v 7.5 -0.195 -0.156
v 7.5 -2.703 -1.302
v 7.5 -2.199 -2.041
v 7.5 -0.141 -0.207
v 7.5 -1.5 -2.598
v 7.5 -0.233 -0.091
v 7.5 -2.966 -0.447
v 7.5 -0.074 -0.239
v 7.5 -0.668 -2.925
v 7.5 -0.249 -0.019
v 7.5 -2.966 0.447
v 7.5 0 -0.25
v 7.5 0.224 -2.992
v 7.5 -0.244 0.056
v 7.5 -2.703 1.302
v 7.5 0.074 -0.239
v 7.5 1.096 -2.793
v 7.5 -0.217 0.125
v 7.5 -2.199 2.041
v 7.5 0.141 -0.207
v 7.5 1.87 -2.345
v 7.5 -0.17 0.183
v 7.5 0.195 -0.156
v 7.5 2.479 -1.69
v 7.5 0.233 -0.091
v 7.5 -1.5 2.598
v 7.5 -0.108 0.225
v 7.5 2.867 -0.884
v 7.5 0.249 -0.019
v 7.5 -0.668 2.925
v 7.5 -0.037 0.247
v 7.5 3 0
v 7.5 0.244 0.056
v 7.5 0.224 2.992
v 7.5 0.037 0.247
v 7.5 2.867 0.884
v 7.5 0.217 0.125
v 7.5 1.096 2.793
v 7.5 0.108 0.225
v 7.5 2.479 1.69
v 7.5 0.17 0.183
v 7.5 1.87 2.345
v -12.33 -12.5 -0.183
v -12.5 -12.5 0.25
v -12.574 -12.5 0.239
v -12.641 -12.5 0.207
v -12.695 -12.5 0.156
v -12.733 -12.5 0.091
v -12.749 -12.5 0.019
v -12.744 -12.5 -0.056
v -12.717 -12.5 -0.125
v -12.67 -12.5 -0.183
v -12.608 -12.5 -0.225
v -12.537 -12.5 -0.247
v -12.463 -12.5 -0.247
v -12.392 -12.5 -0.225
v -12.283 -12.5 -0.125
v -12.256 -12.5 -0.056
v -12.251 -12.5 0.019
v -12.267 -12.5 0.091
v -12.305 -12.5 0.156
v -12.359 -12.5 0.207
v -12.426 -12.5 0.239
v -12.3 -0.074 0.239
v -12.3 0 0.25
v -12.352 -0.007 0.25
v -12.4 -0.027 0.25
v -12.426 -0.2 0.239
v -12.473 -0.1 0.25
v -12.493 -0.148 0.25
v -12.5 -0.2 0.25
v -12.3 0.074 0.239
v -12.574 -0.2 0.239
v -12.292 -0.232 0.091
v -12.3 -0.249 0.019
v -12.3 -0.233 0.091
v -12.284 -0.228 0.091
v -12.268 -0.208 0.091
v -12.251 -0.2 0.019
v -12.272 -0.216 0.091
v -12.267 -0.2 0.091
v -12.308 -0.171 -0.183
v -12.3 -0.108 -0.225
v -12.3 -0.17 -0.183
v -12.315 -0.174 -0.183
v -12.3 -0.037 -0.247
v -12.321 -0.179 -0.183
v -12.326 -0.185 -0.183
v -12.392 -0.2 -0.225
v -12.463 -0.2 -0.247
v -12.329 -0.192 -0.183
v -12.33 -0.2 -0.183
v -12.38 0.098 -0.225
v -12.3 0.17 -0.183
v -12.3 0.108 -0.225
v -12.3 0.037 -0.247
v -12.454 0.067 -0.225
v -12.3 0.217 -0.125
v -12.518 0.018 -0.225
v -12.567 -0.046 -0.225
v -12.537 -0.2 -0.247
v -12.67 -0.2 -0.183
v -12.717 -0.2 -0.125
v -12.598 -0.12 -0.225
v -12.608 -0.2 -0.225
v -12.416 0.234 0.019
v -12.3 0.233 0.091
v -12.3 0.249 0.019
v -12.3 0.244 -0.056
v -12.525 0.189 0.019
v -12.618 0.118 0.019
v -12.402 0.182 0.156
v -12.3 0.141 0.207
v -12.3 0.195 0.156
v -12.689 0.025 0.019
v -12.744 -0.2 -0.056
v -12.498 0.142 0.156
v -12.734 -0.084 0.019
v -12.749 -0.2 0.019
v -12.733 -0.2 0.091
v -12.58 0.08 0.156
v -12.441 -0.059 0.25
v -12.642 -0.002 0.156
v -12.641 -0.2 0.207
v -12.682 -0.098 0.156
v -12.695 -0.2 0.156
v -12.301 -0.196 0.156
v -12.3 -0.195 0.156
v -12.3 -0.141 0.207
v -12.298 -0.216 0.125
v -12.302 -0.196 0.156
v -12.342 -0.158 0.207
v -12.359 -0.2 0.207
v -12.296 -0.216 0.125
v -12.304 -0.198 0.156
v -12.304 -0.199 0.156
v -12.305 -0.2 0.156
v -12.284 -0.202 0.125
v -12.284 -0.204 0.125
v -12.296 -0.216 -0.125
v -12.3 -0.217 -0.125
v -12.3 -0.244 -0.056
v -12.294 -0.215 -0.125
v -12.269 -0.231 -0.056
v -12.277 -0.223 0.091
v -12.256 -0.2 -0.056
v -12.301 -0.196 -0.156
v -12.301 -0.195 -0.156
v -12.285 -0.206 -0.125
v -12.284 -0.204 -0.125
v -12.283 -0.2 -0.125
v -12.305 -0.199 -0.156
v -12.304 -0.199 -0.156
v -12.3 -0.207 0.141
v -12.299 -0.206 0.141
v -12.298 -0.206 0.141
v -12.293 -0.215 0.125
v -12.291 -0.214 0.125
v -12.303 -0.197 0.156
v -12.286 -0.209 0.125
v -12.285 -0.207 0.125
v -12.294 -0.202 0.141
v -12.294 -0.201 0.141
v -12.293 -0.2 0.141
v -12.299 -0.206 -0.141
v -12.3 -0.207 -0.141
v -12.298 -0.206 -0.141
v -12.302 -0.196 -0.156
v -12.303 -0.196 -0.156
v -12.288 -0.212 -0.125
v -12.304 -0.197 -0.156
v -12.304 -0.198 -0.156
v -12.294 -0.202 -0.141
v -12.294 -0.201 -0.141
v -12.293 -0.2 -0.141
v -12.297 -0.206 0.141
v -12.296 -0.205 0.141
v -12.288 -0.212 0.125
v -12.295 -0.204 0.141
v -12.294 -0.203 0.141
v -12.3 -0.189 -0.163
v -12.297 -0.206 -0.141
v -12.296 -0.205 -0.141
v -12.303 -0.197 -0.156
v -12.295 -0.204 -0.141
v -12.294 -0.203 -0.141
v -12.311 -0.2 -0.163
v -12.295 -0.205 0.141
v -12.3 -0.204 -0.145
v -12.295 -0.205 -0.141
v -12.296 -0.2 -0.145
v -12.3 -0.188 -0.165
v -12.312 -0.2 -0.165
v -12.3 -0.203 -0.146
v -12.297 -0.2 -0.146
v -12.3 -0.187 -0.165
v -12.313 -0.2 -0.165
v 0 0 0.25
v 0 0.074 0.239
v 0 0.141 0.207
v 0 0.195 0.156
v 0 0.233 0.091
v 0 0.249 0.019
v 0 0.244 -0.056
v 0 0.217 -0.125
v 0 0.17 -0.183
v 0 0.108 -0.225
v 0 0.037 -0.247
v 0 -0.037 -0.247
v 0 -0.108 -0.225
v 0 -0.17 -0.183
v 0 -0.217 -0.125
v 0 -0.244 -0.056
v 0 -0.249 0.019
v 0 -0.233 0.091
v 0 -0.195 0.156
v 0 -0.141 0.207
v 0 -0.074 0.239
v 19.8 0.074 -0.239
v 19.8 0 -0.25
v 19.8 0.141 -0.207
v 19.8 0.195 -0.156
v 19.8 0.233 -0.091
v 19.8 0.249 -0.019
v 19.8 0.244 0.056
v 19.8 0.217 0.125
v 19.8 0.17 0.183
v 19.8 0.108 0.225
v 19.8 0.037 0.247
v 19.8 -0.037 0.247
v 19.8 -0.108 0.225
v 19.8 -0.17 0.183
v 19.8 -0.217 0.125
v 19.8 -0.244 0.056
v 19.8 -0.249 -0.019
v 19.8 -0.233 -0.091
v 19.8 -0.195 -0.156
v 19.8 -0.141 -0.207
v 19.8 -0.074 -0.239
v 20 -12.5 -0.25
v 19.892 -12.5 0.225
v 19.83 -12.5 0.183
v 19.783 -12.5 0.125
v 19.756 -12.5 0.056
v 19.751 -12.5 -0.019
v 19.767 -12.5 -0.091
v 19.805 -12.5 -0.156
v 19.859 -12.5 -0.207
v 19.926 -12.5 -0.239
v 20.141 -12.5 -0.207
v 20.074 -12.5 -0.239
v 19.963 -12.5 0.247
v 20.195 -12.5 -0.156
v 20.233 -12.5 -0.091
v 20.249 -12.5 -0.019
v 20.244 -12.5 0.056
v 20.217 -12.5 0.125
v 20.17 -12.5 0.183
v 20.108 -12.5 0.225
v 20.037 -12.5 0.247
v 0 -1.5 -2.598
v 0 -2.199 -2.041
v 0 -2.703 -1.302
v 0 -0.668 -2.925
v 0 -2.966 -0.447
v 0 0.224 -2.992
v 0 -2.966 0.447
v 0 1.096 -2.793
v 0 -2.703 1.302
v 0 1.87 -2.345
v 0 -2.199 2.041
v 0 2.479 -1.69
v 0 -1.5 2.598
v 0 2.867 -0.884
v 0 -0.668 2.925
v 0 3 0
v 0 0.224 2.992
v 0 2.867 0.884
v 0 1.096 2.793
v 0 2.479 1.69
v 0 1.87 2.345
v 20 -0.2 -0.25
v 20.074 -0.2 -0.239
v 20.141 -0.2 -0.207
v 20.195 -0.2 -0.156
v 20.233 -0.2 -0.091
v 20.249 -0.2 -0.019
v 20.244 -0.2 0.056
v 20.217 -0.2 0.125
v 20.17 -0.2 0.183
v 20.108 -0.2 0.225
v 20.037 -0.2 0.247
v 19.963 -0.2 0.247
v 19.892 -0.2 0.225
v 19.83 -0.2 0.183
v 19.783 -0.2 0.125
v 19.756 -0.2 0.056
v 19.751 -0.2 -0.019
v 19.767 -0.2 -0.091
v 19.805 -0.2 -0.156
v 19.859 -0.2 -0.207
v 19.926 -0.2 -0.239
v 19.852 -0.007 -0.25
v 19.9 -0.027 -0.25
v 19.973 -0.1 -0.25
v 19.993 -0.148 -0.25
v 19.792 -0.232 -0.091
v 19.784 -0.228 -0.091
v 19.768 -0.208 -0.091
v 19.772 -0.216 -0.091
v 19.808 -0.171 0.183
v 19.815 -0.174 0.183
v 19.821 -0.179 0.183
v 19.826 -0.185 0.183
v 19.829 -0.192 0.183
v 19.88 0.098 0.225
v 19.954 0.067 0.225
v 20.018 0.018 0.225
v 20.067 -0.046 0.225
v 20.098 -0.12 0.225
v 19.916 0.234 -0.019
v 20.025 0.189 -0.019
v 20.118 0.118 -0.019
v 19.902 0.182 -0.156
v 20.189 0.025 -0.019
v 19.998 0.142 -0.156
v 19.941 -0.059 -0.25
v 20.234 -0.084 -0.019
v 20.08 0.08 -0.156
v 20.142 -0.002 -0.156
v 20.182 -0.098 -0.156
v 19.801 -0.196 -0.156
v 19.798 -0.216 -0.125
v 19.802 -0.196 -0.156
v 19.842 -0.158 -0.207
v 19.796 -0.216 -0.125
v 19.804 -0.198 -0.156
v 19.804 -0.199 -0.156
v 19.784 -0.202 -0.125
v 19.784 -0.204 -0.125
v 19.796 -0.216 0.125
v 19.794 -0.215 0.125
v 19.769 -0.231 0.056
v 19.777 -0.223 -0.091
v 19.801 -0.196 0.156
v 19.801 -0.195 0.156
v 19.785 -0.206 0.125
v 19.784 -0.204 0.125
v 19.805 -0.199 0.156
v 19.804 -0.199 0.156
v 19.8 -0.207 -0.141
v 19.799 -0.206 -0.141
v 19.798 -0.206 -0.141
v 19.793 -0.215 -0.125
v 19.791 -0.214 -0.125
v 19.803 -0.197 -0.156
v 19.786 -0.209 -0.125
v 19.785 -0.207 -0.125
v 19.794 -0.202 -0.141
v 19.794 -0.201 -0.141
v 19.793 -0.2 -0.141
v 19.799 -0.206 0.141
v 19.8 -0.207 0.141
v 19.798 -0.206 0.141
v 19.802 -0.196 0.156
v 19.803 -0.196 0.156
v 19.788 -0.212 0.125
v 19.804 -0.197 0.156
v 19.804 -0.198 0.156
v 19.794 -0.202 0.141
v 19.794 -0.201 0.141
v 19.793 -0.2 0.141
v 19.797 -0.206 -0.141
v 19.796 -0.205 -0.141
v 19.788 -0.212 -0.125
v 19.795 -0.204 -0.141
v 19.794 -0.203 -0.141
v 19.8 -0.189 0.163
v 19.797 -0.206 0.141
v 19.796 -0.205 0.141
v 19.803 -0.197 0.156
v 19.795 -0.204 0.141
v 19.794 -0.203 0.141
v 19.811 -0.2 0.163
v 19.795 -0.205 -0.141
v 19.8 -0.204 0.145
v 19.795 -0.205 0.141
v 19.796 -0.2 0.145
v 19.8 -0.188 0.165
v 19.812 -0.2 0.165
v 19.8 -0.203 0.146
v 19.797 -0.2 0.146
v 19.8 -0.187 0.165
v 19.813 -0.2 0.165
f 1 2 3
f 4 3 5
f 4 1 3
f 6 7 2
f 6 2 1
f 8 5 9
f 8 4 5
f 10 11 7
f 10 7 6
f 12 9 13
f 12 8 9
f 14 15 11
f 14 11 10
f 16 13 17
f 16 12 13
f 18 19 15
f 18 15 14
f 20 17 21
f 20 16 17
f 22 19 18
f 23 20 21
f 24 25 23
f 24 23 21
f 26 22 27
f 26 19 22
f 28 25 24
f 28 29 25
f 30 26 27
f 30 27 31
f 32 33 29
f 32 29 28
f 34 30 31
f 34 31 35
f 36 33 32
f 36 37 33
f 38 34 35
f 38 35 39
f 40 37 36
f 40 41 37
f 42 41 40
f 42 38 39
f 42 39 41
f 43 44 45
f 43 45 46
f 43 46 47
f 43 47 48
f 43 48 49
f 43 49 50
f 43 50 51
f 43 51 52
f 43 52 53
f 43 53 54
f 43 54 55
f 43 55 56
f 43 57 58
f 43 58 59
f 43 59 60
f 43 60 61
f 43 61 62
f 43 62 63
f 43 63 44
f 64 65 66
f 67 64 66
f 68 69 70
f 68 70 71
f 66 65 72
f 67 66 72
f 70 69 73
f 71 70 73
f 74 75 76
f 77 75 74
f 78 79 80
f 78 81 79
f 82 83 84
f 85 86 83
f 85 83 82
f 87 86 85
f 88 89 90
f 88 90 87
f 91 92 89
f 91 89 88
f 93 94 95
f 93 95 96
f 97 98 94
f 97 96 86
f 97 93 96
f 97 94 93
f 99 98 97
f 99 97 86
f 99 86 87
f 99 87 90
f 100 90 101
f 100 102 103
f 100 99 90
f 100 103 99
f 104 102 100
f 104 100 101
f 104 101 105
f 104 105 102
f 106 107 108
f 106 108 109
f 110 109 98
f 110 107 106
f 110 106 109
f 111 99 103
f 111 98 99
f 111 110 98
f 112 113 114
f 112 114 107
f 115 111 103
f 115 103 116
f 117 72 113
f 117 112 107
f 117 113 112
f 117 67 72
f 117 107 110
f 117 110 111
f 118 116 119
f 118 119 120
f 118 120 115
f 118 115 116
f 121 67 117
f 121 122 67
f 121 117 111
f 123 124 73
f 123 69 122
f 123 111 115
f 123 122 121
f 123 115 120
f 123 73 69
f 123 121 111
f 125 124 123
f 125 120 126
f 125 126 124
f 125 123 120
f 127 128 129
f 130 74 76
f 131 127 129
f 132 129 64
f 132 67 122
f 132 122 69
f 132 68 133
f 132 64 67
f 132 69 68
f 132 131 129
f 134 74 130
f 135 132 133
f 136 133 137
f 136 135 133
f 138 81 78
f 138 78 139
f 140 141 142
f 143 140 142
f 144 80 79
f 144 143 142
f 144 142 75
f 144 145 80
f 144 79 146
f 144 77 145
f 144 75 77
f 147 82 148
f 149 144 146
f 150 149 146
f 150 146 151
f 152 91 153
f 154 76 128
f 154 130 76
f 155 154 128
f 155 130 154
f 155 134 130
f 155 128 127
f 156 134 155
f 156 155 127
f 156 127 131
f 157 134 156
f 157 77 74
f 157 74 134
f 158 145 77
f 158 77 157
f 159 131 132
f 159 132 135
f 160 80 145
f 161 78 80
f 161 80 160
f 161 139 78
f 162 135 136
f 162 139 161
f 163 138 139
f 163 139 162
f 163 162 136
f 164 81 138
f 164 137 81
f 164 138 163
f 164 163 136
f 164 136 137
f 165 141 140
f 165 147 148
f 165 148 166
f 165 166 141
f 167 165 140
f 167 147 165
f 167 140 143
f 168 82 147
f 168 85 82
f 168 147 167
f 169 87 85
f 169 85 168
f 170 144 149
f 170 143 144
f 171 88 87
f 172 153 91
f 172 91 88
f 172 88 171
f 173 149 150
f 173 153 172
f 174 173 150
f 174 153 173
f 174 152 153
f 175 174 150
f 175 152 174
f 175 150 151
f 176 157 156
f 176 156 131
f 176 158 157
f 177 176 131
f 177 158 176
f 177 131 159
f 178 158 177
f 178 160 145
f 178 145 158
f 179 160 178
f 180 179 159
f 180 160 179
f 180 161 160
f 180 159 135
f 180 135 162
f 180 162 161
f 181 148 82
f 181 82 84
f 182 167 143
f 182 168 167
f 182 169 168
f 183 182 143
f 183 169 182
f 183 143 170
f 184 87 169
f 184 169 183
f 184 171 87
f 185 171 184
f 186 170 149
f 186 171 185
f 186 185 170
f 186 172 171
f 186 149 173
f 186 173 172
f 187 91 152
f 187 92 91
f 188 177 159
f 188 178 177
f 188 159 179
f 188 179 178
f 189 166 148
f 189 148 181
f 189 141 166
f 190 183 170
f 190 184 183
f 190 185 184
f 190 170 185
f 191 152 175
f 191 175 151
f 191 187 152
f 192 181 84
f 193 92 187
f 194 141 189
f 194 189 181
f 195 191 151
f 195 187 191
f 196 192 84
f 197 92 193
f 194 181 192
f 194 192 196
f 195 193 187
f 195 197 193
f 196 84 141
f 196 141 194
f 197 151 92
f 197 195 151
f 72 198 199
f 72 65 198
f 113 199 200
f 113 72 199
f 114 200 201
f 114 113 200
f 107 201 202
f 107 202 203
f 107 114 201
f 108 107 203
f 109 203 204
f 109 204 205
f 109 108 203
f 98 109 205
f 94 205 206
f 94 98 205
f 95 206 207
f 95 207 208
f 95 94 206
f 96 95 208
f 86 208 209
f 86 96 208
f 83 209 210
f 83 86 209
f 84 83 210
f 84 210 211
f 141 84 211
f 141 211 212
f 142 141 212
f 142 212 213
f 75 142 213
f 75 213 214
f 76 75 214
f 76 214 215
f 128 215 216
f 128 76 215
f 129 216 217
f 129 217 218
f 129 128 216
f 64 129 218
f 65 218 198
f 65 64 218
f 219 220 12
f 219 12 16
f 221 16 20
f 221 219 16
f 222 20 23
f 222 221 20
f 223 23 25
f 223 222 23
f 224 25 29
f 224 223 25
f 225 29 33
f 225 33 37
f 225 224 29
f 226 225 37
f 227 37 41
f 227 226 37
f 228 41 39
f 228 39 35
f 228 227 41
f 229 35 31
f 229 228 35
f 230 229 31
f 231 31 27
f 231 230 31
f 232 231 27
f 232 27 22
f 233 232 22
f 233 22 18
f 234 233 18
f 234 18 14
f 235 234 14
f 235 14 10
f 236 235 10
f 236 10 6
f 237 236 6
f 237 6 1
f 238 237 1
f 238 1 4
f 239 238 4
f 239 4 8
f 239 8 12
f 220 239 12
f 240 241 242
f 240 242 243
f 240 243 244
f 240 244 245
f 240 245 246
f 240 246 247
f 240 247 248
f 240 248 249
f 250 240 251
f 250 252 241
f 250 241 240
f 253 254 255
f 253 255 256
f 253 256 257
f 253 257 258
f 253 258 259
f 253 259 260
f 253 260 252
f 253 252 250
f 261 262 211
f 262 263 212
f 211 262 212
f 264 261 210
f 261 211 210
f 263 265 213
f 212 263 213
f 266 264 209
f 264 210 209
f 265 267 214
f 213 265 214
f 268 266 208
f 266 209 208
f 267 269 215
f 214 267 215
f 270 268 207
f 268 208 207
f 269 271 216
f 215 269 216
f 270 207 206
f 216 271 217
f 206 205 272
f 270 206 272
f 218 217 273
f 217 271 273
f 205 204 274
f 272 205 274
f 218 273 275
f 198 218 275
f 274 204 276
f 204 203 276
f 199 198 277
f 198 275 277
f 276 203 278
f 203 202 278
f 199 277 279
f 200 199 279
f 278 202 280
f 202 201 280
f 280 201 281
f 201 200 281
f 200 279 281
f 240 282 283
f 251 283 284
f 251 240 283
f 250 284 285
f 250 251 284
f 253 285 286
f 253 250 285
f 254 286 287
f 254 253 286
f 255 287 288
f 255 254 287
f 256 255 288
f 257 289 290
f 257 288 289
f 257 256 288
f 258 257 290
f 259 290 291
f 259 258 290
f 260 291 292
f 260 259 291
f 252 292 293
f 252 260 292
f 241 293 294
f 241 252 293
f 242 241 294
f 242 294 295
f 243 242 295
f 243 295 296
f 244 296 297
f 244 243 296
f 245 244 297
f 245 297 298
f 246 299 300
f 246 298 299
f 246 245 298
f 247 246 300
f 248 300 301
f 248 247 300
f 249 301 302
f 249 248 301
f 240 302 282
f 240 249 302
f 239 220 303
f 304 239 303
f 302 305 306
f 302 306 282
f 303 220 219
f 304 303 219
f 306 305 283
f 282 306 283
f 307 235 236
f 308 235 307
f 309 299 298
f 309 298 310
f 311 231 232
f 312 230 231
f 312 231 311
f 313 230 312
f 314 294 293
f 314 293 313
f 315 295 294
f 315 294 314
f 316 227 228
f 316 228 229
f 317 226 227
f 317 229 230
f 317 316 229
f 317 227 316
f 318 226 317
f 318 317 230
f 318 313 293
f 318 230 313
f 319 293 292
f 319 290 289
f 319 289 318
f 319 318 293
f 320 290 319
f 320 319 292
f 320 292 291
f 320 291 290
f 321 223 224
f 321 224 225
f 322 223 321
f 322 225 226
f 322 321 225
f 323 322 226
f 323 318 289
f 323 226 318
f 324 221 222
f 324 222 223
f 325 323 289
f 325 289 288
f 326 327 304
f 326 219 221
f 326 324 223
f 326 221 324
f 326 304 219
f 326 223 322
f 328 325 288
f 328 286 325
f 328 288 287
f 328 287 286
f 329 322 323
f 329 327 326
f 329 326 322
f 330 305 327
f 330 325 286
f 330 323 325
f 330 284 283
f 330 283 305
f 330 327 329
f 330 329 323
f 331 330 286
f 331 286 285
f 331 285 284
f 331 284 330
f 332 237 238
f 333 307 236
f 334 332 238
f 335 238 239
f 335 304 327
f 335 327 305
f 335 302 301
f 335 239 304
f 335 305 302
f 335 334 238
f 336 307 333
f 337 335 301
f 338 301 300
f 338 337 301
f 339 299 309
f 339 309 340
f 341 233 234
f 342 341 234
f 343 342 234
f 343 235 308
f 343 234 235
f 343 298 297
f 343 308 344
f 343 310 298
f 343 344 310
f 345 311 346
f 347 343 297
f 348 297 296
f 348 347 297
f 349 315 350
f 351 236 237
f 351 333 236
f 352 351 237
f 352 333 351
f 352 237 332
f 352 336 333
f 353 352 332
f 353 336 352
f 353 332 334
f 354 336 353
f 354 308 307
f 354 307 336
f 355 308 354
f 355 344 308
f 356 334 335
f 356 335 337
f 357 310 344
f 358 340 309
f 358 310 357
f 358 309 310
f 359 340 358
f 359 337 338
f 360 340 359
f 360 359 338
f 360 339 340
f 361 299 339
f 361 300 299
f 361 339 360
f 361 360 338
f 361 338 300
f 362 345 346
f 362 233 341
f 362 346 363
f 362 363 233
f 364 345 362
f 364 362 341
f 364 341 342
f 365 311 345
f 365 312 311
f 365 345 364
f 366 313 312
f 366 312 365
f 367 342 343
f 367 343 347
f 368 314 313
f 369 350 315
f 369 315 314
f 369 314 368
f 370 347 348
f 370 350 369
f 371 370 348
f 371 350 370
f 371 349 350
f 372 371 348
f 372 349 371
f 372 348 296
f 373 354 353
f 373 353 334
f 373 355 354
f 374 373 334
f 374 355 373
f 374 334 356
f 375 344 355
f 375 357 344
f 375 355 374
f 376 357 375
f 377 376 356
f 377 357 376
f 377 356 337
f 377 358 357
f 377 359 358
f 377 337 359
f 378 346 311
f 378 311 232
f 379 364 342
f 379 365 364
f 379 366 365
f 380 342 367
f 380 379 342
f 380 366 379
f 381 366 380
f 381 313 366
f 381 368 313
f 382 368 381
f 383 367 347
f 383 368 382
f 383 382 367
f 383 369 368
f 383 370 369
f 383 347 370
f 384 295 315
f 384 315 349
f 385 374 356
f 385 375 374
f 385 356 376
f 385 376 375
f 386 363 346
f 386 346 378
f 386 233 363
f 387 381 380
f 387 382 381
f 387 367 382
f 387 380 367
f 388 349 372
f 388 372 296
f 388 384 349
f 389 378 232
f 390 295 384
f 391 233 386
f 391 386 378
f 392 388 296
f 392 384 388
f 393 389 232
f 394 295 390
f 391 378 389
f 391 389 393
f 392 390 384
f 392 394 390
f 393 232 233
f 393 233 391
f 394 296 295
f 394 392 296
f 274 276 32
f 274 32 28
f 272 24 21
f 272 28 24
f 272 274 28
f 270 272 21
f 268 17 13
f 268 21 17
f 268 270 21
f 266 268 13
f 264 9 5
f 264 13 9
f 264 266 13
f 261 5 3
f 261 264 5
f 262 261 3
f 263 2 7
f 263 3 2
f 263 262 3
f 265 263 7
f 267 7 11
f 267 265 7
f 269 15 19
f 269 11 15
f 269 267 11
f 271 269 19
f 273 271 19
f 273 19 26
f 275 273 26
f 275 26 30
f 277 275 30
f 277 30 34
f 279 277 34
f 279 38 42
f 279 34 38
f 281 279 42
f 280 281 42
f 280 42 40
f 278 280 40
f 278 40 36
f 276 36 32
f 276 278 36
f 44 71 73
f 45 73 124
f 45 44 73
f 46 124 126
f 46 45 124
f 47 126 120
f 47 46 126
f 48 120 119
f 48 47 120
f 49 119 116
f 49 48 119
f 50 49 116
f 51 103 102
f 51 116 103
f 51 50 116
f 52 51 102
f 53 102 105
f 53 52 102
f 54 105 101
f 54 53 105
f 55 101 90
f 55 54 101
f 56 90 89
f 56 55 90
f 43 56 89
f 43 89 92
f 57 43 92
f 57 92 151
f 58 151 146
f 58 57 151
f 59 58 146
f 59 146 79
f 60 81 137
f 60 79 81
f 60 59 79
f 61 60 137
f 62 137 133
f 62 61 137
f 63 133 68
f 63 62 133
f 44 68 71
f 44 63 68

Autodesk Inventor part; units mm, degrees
ref_plane "YZ Plane" through (0, 0, 0) normal (1, 0, 0) x (0, 1, 0)
sketch "Sketch1" plane through (0, 0, 0) normal (0, 0, 1) x (1, 0, 0)
  line L0 (0, 0) -> (7.5, 0)
  line L1 (7.5, 0) -> (7.5, 3)
  line L2 (7.5, 3) -> (0, 3)
  line L3 (0, 3) -> (0, 0)
  dimension "d0" = 7.5
  dimension "d1" = 3
revolve "Revolution1" add sketch "Sketch1" angle 360 about axis through (0, 0, 0) along (1, 0, 0)
sketch "Sketch2" plane through (0, 0, 0) normal (0, 0, 1) x (1, 0, 0)
  line L0 (7.5, -3) -> (7.5, 3) projected
  line L1 (7.5, 0) -> (19.8, 0)
  line L2 (20, -0.2) -> (20, -12.5)
  line L3 (0, 0) -> (-12.3, 0)
  line L4 (-12.5, -0.2) -> (-12.5, -12.5)
  arc A0 (-12.3, 0) -> (-12.5, -0.2) centre (-12.3, -0.2) ccw
  arc A1 (20, -0.2) -> (19.8, 0) centre (19.8, -0.2) ccw
  point P0 (20, 0)
  point P1 (-12.5, 0)
  dimension "d3" = 12.5
  dimension "d4" = 12.5
  dimension "d5" = 12.5
  dimension "d6" = 12.5
  dimension "d7" = 0.2
ref_plane "Work Plane1" through (7.5, 0, 0) normal (1, 0, 0) x (0, 0, -1)
ref_plane "Work Plane2" through (0, 0, 0) normal (-1, 0, 0) x (0, 0, 1)
sketch "Sketch3" plane through (7.5, 0, 0) normal (1, 0, 0) x (0, 0, -1)
  circle A0 centre (0, 0) radius 0.25
  dimension "d10" = 0.5
sketch "Sketch4" plane through (0, 0, 0) normal (-1, 0, 0) x (0, 0, 1)
  circle A0 centre (0, 0) radius 0.25
  dimension "d11" = 0.5
sweep "Sweep1" add profiles "Sketch4" path "Sketch2" path curves L3 A0 L4
sweep "Sweep2" add profiles "Sketch3" path "Sketch2" path curves L1 A1 L2
equation "\"BendRadius\" = Thickness"
equation "\"BendReliefWidth\" = Thickness"
equation "\"BendReliefDepth\" = 0.5 * Thickness"
equation "\"CornerReliefSize\" = 4 * Thickness"
equation "\"MinimumRemnant\" = 2 * Thickness"
equation "\"TransitionRadius\" = BendRadius"
equation "\"JacobiRadiusSize\" = BendRadius"
equation "\"GapSize\" = Thickness"
equation "\"Thickness\" = 3.048"
properties part number "KC139"
